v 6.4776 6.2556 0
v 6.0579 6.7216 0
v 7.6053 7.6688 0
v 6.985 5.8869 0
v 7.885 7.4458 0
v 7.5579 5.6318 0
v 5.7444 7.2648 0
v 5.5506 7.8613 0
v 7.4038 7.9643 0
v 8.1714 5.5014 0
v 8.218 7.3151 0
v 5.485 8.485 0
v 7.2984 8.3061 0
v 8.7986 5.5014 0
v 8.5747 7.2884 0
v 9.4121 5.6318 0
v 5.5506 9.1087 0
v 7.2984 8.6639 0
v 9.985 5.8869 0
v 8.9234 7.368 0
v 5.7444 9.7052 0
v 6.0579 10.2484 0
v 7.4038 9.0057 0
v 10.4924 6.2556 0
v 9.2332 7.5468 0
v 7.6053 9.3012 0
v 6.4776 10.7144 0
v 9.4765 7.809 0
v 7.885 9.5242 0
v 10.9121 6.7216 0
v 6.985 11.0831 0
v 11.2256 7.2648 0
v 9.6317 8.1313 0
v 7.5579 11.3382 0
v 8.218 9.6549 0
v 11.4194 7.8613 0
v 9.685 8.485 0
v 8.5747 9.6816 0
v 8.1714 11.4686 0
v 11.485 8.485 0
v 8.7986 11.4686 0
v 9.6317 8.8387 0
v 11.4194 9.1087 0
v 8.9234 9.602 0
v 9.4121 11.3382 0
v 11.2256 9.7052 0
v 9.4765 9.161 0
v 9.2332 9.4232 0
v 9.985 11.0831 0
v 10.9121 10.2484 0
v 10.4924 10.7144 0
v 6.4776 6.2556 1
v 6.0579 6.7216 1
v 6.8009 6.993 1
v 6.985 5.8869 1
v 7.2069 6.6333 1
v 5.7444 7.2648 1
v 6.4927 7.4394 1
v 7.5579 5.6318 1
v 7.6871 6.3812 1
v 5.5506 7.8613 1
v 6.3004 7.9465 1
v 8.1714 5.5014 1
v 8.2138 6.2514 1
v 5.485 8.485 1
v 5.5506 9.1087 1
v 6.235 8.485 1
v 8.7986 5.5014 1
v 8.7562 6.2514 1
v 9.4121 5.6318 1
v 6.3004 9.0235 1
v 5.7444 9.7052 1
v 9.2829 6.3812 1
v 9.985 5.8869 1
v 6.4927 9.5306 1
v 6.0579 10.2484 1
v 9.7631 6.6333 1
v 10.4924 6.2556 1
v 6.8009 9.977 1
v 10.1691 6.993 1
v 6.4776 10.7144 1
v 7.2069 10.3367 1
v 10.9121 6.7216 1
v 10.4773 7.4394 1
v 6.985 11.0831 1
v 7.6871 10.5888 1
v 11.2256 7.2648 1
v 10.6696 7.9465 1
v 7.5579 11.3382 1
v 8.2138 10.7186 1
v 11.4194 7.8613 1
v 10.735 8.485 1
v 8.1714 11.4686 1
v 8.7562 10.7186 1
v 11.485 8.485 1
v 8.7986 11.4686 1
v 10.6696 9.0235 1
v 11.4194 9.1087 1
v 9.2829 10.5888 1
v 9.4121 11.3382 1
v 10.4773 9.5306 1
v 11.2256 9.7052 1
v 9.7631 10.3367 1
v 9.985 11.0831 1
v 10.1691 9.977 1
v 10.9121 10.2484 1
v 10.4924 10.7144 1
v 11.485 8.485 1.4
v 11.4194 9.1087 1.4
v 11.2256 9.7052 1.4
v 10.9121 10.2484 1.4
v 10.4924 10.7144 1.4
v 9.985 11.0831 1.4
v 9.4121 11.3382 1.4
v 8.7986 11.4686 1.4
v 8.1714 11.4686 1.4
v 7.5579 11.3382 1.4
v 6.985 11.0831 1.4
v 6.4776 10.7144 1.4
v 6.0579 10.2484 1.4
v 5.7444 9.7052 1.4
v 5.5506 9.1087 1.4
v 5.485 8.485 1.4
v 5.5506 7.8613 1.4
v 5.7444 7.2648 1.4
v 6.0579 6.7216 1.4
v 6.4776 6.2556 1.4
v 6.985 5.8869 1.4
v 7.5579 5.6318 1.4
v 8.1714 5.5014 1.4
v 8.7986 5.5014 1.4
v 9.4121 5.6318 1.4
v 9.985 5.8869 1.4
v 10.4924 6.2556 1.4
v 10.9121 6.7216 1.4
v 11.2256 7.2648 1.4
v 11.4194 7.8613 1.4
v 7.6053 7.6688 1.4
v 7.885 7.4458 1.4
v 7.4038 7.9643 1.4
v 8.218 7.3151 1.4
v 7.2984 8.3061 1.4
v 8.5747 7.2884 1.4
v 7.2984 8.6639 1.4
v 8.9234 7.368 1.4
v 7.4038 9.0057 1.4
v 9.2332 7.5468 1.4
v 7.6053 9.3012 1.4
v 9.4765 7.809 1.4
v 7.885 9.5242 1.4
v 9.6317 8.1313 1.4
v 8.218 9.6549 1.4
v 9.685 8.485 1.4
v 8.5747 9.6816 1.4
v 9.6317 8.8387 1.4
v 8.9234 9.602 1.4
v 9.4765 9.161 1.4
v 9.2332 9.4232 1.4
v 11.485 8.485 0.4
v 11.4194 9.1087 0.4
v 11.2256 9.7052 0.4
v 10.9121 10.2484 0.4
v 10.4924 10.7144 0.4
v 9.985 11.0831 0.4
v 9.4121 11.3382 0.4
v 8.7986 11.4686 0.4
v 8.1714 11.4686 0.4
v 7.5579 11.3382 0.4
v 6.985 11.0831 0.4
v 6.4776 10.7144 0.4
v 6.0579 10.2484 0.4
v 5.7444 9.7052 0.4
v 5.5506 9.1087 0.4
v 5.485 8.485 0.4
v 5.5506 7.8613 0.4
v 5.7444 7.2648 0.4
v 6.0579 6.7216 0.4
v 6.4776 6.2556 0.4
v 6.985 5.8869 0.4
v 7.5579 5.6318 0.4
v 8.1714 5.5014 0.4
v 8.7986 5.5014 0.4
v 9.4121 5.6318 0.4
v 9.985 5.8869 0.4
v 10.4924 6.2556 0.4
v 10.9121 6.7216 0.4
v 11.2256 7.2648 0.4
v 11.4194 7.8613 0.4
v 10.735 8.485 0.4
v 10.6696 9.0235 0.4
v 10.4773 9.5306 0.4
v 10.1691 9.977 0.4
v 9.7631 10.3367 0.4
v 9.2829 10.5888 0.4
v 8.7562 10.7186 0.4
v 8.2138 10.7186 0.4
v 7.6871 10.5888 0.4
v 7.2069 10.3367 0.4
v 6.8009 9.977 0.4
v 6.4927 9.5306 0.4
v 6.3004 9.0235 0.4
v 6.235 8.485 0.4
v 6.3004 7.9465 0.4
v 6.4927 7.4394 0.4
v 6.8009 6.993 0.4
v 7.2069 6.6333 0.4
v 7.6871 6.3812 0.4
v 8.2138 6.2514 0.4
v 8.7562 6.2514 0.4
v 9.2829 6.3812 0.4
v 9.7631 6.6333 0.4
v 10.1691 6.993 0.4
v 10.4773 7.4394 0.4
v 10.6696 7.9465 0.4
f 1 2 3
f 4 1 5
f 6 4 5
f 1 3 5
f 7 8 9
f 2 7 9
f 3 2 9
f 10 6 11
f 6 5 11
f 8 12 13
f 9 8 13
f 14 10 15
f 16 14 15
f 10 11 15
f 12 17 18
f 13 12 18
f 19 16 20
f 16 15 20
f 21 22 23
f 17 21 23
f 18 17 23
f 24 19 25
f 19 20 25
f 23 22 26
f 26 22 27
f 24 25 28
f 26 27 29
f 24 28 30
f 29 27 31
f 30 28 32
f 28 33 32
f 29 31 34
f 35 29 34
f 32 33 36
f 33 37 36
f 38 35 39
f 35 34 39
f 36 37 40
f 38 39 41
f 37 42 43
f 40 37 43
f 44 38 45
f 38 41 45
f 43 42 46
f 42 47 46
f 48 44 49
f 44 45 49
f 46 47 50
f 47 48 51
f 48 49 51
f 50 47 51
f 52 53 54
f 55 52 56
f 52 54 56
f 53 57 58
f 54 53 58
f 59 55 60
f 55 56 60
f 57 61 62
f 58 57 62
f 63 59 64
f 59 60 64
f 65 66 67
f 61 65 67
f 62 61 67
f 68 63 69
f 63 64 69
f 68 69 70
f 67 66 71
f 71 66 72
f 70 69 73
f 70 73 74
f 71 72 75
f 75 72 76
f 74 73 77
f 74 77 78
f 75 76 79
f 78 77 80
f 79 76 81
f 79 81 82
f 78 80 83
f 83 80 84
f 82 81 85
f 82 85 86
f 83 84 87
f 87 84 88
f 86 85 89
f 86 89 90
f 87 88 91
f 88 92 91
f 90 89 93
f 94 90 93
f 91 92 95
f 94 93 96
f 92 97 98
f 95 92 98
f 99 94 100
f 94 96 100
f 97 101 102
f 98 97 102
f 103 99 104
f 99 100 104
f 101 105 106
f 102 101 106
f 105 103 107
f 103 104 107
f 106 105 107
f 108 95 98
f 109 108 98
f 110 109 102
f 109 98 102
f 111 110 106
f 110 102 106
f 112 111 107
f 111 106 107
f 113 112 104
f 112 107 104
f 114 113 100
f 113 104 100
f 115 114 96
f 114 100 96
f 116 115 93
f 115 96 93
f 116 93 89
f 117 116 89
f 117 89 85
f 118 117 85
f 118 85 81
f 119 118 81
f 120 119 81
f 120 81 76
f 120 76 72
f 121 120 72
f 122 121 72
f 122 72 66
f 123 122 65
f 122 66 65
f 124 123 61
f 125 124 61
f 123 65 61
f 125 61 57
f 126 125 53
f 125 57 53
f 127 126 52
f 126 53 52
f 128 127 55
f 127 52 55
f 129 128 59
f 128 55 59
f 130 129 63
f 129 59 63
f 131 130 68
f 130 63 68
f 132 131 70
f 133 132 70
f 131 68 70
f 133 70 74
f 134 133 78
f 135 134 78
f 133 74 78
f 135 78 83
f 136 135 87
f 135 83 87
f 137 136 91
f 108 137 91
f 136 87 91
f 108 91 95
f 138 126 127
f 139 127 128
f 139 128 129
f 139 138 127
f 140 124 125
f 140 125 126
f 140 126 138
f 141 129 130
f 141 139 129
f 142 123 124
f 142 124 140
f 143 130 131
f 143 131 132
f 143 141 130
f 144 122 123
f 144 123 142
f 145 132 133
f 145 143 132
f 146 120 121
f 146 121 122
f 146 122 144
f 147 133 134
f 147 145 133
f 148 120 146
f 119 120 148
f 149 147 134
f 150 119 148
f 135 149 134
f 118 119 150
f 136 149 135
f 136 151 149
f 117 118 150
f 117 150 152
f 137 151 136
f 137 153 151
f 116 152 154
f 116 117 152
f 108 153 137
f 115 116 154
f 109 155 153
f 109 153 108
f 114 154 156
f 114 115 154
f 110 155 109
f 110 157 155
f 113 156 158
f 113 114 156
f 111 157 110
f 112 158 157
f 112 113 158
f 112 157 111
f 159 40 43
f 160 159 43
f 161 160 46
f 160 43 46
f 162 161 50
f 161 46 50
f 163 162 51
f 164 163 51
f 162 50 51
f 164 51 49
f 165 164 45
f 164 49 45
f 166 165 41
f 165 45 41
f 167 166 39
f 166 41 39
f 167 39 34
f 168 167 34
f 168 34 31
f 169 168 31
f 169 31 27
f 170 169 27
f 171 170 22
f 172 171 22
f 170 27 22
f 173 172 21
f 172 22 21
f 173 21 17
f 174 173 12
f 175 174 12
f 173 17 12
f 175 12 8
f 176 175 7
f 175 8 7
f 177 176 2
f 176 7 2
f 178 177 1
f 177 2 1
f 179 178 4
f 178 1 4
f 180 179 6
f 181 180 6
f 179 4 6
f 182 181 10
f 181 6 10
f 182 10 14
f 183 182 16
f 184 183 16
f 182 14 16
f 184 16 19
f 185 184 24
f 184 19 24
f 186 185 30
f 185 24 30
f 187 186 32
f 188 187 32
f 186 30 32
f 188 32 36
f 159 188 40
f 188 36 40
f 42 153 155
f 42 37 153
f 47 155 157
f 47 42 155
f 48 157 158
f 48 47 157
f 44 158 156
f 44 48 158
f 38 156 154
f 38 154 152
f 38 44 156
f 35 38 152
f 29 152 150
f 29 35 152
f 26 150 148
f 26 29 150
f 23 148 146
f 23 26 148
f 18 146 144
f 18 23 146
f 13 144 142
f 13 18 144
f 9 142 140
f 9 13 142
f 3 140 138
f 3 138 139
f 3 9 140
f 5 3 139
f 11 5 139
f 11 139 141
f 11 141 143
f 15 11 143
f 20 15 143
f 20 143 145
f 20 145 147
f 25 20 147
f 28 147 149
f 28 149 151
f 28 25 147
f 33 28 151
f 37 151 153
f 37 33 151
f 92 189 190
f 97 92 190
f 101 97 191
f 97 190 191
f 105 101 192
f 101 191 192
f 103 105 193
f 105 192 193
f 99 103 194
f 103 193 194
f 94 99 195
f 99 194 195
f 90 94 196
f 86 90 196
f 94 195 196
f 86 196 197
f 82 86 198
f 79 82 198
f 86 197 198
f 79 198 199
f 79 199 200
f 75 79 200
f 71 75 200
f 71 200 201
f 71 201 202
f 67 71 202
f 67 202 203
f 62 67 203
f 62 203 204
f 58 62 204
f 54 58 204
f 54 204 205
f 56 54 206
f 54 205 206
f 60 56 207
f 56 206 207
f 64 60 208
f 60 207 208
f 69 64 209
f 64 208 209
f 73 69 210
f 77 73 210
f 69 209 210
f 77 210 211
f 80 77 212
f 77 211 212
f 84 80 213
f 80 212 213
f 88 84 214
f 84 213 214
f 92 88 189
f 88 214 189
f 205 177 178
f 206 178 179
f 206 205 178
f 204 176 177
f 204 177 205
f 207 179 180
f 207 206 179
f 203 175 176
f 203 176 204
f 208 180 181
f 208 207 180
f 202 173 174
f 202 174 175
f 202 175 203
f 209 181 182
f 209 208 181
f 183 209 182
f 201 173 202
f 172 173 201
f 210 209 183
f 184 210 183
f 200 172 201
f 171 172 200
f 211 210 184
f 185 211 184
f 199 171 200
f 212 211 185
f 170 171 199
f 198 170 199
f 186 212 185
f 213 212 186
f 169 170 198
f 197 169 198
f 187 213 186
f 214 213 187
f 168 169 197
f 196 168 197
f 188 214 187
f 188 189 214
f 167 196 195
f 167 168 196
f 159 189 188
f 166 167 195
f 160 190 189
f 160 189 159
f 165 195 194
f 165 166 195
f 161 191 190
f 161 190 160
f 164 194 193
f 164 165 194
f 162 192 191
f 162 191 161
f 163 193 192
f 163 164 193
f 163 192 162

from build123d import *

# Parameters (mm, degrees)
SKETCH1_R           = 3
SKETCH1_R_2         = 2.25
SKETCH1_R_3         = 1.2
BOSS_EXTRUDE1_DEPTH = 0.4
BOSS_EXTRUDE4_START = 0.4
SKETCH1_8_R         = 2.25
SKETCH1_8_R_2       = 1.2
BOSS_EXTRUDE4_DEPTH = 0.6
BOSS_EXTRUDE5_START = 1
SKETCH1_9_R         = 3
SKETCH1_9_R_2       = 2.25
SKETCH1_9_R_3       = 1.2
BOSS_EXTRUDE5_DEPTH = 0.4


with BuildPart() as part:
    # Sketch1 → Boss-Extrude1 (new body)
    # profile 1 of 2: a face of its own
    with BuildSketch(Plane.XY):
        with Locations((8.485, 8.485)):
            Circle(SKETCH1_R)
        with Locations((8.485, 8.485)):
            Circle(SKETCH1_R_2, mode=Mode.SUBTRACT)
    # profile 2 of 2: a face of its own
    with BuildSketch(Plane.XY):
        with Locations((8.485, 8.485)):
            Circle(SKETCH1_R_2)
        with Locations((8.485, 8.485)):
            Circle(SKETCH1_R_3, mode=Mode.SUBTRACT)
    extrude(amount=BOSS_EXTRUDE1_DEPTH)

    # Sketch1<8> → Boss-Extrude4 (add)
    with BuildSketch(Plane.XY.offset(BOSS_EXTRUDE4_START)):
        with Locations((8.485, 8.485)):
            Circle(SKETCH1_8_R)
        with Locations((8.485, 8.485)):
            Circle(SKETCH1_8_R_2, mode=Mode.SUBTRACT)
    extrude(amount=BOSS_EXTRUDE4_DEPTH)

    # Sketch1<9> → Boss-Extrude5 (add)
    # profile 1 of 2: a face of its own
    with BuildSketch(Plane.XY.offset(BOSS_EXTRUDE5_START)):
        with Locations((8.485, 8.485)):
            Circle(SKETCH1_9_R)
        with Locations((8.485, 8.485)):
            Circle(SKETCH1_9_R_2, mode=Mode.SUBTRACT)
    # profile 2 of 2: a face of its own
    with BuildSketch(Plane.XY.offset(BOSS_EXTRUDE5_START)):
        with Locations((8.485, 8.485)):
            Circle(SKETCH1_9_R_2)
        with Locations((8.485, 8.485)):
            Circle(SKETCH1_9_R_3, mode=Mode.SUBTRACT)
    extrude(amount=BOSS_EXTRUDE5_DEPTH)


solid = part.part
